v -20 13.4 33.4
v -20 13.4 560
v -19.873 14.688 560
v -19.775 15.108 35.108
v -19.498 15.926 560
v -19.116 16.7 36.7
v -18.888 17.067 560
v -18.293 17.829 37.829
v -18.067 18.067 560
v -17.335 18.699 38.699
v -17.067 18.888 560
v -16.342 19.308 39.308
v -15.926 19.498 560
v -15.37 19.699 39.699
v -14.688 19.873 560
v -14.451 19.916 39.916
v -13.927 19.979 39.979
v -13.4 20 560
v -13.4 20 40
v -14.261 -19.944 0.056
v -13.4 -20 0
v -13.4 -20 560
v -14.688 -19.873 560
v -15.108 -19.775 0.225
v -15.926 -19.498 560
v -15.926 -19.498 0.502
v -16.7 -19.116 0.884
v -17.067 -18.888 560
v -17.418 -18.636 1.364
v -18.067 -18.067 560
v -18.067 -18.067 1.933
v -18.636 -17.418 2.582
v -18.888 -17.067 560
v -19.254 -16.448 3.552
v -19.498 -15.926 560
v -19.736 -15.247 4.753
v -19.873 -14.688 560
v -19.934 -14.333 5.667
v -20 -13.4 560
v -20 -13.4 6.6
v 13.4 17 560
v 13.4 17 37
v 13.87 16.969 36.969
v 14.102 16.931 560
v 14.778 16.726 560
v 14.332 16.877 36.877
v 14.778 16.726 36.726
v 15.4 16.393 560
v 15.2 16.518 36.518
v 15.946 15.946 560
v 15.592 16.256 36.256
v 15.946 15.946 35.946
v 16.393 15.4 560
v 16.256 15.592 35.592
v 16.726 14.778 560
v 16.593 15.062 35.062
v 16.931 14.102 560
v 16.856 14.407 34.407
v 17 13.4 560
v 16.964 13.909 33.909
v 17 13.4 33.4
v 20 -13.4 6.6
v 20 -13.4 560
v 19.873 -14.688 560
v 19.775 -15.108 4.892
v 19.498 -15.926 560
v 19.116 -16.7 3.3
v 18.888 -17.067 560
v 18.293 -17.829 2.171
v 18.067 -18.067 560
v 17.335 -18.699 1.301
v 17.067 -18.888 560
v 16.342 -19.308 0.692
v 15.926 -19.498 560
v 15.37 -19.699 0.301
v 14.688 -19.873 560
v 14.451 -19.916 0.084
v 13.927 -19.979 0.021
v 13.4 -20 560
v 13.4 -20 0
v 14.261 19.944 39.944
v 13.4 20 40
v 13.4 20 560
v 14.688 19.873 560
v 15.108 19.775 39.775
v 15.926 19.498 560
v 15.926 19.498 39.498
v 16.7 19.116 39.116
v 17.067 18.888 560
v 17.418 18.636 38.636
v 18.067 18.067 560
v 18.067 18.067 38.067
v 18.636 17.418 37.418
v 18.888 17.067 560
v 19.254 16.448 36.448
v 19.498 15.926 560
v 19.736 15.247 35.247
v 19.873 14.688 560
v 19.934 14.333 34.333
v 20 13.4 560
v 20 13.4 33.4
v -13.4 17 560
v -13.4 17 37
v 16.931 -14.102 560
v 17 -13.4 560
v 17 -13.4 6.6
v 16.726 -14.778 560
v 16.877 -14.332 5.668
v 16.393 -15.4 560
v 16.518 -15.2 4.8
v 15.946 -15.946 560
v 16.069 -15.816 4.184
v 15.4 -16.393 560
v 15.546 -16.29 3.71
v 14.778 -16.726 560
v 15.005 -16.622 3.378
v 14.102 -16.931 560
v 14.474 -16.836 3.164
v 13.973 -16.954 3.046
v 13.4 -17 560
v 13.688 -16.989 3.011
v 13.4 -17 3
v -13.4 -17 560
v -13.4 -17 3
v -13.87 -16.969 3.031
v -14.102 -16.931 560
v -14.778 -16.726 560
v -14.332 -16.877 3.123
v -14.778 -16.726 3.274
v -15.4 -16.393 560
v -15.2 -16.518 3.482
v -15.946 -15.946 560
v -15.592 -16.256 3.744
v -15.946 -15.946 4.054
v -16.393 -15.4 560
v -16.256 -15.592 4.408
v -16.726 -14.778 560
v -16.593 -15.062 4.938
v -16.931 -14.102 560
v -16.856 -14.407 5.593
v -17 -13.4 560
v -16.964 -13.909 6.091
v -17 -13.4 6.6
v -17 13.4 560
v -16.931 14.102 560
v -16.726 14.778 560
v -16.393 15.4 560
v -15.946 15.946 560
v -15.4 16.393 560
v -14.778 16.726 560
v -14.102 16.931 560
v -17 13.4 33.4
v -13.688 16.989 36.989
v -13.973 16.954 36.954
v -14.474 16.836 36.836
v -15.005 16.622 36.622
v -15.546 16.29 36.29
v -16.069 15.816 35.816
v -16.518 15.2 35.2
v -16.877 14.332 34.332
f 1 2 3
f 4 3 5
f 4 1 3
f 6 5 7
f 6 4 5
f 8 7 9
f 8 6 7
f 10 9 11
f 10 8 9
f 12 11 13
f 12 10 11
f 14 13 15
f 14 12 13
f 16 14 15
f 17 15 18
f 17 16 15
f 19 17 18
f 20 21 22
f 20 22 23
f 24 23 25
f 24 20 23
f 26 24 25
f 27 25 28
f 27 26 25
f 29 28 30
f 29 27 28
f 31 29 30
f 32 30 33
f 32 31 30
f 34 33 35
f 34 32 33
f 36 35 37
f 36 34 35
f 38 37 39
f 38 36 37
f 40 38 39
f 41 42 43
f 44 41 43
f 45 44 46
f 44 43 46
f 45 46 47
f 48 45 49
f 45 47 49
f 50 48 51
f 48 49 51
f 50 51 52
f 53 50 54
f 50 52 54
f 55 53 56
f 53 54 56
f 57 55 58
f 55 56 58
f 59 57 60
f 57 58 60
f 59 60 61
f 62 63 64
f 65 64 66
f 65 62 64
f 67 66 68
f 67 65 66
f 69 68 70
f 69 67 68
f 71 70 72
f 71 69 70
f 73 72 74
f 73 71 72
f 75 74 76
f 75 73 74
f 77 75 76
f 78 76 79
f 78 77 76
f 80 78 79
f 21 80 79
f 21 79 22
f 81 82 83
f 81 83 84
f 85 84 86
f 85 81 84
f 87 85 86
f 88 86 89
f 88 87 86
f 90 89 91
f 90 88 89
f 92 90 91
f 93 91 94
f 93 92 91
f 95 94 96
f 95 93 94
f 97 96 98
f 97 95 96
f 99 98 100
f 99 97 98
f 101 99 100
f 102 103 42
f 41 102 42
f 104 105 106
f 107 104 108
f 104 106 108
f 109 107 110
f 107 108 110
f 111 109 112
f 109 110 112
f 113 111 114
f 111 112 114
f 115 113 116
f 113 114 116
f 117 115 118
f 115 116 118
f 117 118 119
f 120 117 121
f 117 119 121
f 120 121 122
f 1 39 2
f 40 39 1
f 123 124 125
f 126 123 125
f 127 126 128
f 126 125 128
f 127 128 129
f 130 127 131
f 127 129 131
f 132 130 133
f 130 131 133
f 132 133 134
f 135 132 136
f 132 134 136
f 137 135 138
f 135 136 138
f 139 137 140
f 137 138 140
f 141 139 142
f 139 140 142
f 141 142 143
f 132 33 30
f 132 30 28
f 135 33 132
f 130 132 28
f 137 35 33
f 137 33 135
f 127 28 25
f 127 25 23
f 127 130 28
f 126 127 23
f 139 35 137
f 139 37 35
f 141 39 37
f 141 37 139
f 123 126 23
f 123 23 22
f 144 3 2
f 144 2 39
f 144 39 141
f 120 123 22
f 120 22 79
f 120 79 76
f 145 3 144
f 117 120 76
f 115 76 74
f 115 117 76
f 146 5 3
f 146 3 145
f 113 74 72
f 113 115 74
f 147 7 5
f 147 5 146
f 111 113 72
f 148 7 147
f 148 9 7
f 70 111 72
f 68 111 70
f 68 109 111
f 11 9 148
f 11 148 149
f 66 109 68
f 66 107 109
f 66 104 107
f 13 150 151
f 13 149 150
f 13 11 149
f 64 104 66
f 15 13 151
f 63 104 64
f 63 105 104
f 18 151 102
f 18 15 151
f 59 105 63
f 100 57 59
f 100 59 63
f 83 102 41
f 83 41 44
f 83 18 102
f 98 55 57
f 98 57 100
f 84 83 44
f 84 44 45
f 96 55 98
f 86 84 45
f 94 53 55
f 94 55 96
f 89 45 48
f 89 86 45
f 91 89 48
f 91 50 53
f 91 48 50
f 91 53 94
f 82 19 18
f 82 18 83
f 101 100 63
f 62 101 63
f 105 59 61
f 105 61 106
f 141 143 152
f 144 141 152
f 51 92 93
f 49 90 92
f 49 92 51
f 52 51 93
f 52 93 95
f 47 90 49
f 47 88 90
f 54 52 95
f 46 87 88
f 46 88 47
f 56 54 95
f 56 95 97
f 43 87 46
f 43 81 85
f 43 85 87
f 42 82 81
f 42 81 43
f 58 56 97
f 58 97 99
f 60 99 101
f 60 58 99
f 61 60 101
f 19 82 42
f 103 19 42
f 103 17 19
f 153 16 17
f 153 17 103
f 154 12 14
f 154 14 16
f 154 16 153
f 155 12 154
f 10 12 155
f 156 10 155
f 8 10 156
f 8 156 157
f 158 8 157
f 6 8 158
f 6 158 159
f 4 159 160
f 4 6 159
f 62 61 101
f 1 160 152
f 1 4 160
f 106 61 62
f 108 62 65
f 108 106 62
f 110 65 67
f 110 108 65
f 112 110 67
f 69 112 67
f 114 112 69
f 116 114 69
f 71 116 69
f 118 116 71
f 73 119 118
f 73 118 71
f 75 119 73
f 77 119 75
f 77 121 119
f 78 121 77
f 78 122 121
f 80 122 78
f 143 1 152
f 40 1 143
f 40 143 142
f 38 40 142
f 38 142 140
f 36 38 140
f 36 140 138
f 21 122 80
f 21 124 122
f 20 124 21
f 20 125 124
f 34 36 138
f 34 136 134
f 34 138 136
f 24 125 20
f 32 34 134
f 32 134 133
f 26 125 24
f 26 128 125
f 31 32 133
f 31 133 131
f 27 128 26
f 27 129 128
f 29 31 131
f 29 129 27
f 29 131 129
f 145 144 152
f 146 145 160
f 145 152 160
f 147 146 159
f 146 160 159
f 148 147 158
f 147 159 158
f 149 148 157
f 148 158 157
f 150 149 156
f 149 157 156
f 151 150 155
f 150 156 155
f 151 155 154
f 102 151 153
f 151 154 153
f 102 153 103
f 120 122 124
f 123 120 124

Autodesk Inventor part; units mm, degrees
ref_plane "Start plane" through (0, 0, 0) normal (0, 0, 1) x (1, 0, 0)
ref_plane "End plane" through (0, 0, 560) normal (0, 0, 1) x (1, 0, 0)
sketch "Sketch" plane through (0, 0, 0) normal (0, 0, 1) x (1, 0, 0)
  line L0 (-20, -13.4) -> (-20, 13.4)
  line L1 (-13.4, 20) -> (13.4, 20)
  line L2 (20, 13.4) -> (20, -13.4)
  line L3 (13.4, -20) -> (-13.4, -20)
  arc A0 (-20, -13.4) -> (-13.4, -20) centre (-13.4, -13.4) ccw
  arc A1 (-13.4, 20) -> (-20, 13.4) centre (-13.4, 13.4) ccw
  arc A2 (20, 13.4) -> (13.4, 20) centre (13.4, 13.4) ccw
  arc A3 (13.4, -20) -> (20, -13.4) centre (13.4, -13.4) ccw
  arc A4 (-13.4, 17) -> (-17, 13.4) centre (-13.4, 13.4) ccw
  line L4 (-13.4, 17) -> (13.4, 17)
  arc A5 (17, 13.4) -> (13.4, 17) centre (13.4, 13.4) ccw
  line L5 (17, 13.4) -> (17, -13.4)
  arc A6 (13.4, -17) -> (17, -13.4) centre (13.4, -13.4) ccw
  line L6 (13.4, -17) -> (-13.4, -17)
  arc A7 (-17, -13.4) -> (-13.4, -17) centre (-13.4, -13.4) ccw
  line L7 (-17, -13.4) -> (-17, 13.4)
  line L8 (0, 29.9137) -> (0, -29.9137) construction
  line L9 (-29.9137, 0) -> (29.9137, 0) construction
  dimension "d7" = 6.6
  dimension "d10" = 40
  dimension "d11" = 40
  dimension "d12" = 3
  dimension "d15" = 20
  dimension "d16" = 20
extrude "Body" add sketch "Sketch" along normal up to surface (560 mm away) from surface at 0
sketch "Sketch3" plane through (0, 0, 0) normal (0, 0, 1) x (1, 0, 0)
  line L0 (0, 0) -> (10, 0)
ref_plane "Work Plane3" through (0, 0, 0) normal (0, -1, 0) x (1, 0, 0)
sketch "Sketch4" plane through (0, 0, 0) normal (0, -1, 0) x (1, 0, 0)
  line L0 (-2, 0) -> (12, 0)
  line L1 (-2, 560) -> (12, 560)
  dimension "d18" = 560
ref_plane "Work Plane4" through (0, -20, 0) normal (0, 0.7071, -0.7071) x (1, 0, 0)
split "Split1" plane through (0, -20, 0) removes the side toward (0, 0.7071, -0.7071)
ref_plane "Work Plane5" through (1302, 597.6, 560) normal (0, 0, 1) x (1, 0, 0)
split "Split2" plane through (1302, 597.6, 560) removes the side toward (0, 0, 1)
equation "\"d7\" = G_IR"
equation "\"d10\" = G_H"
equation "\"d11\" = G_W"
equation "\"d12\" = G_T"
equation "\"d15\" = 0.5 * d10"
equation "\"d16\" = 0.5 * d11"
equation "\"d3\" = G_L"
equation "\"G_W\" = 40"
equation "\"G_H\" = 40"
equation "\"G_T\" = 3"
equation "\"G_IR\" = 6.6"
equation "\"G_L\" = d18"
equation "\"G_OFFSET_START\" = 0"
properties part number "DIN EN 10305-5 - 40 x 40 x 3  - 560" material "Steel, Mild"
